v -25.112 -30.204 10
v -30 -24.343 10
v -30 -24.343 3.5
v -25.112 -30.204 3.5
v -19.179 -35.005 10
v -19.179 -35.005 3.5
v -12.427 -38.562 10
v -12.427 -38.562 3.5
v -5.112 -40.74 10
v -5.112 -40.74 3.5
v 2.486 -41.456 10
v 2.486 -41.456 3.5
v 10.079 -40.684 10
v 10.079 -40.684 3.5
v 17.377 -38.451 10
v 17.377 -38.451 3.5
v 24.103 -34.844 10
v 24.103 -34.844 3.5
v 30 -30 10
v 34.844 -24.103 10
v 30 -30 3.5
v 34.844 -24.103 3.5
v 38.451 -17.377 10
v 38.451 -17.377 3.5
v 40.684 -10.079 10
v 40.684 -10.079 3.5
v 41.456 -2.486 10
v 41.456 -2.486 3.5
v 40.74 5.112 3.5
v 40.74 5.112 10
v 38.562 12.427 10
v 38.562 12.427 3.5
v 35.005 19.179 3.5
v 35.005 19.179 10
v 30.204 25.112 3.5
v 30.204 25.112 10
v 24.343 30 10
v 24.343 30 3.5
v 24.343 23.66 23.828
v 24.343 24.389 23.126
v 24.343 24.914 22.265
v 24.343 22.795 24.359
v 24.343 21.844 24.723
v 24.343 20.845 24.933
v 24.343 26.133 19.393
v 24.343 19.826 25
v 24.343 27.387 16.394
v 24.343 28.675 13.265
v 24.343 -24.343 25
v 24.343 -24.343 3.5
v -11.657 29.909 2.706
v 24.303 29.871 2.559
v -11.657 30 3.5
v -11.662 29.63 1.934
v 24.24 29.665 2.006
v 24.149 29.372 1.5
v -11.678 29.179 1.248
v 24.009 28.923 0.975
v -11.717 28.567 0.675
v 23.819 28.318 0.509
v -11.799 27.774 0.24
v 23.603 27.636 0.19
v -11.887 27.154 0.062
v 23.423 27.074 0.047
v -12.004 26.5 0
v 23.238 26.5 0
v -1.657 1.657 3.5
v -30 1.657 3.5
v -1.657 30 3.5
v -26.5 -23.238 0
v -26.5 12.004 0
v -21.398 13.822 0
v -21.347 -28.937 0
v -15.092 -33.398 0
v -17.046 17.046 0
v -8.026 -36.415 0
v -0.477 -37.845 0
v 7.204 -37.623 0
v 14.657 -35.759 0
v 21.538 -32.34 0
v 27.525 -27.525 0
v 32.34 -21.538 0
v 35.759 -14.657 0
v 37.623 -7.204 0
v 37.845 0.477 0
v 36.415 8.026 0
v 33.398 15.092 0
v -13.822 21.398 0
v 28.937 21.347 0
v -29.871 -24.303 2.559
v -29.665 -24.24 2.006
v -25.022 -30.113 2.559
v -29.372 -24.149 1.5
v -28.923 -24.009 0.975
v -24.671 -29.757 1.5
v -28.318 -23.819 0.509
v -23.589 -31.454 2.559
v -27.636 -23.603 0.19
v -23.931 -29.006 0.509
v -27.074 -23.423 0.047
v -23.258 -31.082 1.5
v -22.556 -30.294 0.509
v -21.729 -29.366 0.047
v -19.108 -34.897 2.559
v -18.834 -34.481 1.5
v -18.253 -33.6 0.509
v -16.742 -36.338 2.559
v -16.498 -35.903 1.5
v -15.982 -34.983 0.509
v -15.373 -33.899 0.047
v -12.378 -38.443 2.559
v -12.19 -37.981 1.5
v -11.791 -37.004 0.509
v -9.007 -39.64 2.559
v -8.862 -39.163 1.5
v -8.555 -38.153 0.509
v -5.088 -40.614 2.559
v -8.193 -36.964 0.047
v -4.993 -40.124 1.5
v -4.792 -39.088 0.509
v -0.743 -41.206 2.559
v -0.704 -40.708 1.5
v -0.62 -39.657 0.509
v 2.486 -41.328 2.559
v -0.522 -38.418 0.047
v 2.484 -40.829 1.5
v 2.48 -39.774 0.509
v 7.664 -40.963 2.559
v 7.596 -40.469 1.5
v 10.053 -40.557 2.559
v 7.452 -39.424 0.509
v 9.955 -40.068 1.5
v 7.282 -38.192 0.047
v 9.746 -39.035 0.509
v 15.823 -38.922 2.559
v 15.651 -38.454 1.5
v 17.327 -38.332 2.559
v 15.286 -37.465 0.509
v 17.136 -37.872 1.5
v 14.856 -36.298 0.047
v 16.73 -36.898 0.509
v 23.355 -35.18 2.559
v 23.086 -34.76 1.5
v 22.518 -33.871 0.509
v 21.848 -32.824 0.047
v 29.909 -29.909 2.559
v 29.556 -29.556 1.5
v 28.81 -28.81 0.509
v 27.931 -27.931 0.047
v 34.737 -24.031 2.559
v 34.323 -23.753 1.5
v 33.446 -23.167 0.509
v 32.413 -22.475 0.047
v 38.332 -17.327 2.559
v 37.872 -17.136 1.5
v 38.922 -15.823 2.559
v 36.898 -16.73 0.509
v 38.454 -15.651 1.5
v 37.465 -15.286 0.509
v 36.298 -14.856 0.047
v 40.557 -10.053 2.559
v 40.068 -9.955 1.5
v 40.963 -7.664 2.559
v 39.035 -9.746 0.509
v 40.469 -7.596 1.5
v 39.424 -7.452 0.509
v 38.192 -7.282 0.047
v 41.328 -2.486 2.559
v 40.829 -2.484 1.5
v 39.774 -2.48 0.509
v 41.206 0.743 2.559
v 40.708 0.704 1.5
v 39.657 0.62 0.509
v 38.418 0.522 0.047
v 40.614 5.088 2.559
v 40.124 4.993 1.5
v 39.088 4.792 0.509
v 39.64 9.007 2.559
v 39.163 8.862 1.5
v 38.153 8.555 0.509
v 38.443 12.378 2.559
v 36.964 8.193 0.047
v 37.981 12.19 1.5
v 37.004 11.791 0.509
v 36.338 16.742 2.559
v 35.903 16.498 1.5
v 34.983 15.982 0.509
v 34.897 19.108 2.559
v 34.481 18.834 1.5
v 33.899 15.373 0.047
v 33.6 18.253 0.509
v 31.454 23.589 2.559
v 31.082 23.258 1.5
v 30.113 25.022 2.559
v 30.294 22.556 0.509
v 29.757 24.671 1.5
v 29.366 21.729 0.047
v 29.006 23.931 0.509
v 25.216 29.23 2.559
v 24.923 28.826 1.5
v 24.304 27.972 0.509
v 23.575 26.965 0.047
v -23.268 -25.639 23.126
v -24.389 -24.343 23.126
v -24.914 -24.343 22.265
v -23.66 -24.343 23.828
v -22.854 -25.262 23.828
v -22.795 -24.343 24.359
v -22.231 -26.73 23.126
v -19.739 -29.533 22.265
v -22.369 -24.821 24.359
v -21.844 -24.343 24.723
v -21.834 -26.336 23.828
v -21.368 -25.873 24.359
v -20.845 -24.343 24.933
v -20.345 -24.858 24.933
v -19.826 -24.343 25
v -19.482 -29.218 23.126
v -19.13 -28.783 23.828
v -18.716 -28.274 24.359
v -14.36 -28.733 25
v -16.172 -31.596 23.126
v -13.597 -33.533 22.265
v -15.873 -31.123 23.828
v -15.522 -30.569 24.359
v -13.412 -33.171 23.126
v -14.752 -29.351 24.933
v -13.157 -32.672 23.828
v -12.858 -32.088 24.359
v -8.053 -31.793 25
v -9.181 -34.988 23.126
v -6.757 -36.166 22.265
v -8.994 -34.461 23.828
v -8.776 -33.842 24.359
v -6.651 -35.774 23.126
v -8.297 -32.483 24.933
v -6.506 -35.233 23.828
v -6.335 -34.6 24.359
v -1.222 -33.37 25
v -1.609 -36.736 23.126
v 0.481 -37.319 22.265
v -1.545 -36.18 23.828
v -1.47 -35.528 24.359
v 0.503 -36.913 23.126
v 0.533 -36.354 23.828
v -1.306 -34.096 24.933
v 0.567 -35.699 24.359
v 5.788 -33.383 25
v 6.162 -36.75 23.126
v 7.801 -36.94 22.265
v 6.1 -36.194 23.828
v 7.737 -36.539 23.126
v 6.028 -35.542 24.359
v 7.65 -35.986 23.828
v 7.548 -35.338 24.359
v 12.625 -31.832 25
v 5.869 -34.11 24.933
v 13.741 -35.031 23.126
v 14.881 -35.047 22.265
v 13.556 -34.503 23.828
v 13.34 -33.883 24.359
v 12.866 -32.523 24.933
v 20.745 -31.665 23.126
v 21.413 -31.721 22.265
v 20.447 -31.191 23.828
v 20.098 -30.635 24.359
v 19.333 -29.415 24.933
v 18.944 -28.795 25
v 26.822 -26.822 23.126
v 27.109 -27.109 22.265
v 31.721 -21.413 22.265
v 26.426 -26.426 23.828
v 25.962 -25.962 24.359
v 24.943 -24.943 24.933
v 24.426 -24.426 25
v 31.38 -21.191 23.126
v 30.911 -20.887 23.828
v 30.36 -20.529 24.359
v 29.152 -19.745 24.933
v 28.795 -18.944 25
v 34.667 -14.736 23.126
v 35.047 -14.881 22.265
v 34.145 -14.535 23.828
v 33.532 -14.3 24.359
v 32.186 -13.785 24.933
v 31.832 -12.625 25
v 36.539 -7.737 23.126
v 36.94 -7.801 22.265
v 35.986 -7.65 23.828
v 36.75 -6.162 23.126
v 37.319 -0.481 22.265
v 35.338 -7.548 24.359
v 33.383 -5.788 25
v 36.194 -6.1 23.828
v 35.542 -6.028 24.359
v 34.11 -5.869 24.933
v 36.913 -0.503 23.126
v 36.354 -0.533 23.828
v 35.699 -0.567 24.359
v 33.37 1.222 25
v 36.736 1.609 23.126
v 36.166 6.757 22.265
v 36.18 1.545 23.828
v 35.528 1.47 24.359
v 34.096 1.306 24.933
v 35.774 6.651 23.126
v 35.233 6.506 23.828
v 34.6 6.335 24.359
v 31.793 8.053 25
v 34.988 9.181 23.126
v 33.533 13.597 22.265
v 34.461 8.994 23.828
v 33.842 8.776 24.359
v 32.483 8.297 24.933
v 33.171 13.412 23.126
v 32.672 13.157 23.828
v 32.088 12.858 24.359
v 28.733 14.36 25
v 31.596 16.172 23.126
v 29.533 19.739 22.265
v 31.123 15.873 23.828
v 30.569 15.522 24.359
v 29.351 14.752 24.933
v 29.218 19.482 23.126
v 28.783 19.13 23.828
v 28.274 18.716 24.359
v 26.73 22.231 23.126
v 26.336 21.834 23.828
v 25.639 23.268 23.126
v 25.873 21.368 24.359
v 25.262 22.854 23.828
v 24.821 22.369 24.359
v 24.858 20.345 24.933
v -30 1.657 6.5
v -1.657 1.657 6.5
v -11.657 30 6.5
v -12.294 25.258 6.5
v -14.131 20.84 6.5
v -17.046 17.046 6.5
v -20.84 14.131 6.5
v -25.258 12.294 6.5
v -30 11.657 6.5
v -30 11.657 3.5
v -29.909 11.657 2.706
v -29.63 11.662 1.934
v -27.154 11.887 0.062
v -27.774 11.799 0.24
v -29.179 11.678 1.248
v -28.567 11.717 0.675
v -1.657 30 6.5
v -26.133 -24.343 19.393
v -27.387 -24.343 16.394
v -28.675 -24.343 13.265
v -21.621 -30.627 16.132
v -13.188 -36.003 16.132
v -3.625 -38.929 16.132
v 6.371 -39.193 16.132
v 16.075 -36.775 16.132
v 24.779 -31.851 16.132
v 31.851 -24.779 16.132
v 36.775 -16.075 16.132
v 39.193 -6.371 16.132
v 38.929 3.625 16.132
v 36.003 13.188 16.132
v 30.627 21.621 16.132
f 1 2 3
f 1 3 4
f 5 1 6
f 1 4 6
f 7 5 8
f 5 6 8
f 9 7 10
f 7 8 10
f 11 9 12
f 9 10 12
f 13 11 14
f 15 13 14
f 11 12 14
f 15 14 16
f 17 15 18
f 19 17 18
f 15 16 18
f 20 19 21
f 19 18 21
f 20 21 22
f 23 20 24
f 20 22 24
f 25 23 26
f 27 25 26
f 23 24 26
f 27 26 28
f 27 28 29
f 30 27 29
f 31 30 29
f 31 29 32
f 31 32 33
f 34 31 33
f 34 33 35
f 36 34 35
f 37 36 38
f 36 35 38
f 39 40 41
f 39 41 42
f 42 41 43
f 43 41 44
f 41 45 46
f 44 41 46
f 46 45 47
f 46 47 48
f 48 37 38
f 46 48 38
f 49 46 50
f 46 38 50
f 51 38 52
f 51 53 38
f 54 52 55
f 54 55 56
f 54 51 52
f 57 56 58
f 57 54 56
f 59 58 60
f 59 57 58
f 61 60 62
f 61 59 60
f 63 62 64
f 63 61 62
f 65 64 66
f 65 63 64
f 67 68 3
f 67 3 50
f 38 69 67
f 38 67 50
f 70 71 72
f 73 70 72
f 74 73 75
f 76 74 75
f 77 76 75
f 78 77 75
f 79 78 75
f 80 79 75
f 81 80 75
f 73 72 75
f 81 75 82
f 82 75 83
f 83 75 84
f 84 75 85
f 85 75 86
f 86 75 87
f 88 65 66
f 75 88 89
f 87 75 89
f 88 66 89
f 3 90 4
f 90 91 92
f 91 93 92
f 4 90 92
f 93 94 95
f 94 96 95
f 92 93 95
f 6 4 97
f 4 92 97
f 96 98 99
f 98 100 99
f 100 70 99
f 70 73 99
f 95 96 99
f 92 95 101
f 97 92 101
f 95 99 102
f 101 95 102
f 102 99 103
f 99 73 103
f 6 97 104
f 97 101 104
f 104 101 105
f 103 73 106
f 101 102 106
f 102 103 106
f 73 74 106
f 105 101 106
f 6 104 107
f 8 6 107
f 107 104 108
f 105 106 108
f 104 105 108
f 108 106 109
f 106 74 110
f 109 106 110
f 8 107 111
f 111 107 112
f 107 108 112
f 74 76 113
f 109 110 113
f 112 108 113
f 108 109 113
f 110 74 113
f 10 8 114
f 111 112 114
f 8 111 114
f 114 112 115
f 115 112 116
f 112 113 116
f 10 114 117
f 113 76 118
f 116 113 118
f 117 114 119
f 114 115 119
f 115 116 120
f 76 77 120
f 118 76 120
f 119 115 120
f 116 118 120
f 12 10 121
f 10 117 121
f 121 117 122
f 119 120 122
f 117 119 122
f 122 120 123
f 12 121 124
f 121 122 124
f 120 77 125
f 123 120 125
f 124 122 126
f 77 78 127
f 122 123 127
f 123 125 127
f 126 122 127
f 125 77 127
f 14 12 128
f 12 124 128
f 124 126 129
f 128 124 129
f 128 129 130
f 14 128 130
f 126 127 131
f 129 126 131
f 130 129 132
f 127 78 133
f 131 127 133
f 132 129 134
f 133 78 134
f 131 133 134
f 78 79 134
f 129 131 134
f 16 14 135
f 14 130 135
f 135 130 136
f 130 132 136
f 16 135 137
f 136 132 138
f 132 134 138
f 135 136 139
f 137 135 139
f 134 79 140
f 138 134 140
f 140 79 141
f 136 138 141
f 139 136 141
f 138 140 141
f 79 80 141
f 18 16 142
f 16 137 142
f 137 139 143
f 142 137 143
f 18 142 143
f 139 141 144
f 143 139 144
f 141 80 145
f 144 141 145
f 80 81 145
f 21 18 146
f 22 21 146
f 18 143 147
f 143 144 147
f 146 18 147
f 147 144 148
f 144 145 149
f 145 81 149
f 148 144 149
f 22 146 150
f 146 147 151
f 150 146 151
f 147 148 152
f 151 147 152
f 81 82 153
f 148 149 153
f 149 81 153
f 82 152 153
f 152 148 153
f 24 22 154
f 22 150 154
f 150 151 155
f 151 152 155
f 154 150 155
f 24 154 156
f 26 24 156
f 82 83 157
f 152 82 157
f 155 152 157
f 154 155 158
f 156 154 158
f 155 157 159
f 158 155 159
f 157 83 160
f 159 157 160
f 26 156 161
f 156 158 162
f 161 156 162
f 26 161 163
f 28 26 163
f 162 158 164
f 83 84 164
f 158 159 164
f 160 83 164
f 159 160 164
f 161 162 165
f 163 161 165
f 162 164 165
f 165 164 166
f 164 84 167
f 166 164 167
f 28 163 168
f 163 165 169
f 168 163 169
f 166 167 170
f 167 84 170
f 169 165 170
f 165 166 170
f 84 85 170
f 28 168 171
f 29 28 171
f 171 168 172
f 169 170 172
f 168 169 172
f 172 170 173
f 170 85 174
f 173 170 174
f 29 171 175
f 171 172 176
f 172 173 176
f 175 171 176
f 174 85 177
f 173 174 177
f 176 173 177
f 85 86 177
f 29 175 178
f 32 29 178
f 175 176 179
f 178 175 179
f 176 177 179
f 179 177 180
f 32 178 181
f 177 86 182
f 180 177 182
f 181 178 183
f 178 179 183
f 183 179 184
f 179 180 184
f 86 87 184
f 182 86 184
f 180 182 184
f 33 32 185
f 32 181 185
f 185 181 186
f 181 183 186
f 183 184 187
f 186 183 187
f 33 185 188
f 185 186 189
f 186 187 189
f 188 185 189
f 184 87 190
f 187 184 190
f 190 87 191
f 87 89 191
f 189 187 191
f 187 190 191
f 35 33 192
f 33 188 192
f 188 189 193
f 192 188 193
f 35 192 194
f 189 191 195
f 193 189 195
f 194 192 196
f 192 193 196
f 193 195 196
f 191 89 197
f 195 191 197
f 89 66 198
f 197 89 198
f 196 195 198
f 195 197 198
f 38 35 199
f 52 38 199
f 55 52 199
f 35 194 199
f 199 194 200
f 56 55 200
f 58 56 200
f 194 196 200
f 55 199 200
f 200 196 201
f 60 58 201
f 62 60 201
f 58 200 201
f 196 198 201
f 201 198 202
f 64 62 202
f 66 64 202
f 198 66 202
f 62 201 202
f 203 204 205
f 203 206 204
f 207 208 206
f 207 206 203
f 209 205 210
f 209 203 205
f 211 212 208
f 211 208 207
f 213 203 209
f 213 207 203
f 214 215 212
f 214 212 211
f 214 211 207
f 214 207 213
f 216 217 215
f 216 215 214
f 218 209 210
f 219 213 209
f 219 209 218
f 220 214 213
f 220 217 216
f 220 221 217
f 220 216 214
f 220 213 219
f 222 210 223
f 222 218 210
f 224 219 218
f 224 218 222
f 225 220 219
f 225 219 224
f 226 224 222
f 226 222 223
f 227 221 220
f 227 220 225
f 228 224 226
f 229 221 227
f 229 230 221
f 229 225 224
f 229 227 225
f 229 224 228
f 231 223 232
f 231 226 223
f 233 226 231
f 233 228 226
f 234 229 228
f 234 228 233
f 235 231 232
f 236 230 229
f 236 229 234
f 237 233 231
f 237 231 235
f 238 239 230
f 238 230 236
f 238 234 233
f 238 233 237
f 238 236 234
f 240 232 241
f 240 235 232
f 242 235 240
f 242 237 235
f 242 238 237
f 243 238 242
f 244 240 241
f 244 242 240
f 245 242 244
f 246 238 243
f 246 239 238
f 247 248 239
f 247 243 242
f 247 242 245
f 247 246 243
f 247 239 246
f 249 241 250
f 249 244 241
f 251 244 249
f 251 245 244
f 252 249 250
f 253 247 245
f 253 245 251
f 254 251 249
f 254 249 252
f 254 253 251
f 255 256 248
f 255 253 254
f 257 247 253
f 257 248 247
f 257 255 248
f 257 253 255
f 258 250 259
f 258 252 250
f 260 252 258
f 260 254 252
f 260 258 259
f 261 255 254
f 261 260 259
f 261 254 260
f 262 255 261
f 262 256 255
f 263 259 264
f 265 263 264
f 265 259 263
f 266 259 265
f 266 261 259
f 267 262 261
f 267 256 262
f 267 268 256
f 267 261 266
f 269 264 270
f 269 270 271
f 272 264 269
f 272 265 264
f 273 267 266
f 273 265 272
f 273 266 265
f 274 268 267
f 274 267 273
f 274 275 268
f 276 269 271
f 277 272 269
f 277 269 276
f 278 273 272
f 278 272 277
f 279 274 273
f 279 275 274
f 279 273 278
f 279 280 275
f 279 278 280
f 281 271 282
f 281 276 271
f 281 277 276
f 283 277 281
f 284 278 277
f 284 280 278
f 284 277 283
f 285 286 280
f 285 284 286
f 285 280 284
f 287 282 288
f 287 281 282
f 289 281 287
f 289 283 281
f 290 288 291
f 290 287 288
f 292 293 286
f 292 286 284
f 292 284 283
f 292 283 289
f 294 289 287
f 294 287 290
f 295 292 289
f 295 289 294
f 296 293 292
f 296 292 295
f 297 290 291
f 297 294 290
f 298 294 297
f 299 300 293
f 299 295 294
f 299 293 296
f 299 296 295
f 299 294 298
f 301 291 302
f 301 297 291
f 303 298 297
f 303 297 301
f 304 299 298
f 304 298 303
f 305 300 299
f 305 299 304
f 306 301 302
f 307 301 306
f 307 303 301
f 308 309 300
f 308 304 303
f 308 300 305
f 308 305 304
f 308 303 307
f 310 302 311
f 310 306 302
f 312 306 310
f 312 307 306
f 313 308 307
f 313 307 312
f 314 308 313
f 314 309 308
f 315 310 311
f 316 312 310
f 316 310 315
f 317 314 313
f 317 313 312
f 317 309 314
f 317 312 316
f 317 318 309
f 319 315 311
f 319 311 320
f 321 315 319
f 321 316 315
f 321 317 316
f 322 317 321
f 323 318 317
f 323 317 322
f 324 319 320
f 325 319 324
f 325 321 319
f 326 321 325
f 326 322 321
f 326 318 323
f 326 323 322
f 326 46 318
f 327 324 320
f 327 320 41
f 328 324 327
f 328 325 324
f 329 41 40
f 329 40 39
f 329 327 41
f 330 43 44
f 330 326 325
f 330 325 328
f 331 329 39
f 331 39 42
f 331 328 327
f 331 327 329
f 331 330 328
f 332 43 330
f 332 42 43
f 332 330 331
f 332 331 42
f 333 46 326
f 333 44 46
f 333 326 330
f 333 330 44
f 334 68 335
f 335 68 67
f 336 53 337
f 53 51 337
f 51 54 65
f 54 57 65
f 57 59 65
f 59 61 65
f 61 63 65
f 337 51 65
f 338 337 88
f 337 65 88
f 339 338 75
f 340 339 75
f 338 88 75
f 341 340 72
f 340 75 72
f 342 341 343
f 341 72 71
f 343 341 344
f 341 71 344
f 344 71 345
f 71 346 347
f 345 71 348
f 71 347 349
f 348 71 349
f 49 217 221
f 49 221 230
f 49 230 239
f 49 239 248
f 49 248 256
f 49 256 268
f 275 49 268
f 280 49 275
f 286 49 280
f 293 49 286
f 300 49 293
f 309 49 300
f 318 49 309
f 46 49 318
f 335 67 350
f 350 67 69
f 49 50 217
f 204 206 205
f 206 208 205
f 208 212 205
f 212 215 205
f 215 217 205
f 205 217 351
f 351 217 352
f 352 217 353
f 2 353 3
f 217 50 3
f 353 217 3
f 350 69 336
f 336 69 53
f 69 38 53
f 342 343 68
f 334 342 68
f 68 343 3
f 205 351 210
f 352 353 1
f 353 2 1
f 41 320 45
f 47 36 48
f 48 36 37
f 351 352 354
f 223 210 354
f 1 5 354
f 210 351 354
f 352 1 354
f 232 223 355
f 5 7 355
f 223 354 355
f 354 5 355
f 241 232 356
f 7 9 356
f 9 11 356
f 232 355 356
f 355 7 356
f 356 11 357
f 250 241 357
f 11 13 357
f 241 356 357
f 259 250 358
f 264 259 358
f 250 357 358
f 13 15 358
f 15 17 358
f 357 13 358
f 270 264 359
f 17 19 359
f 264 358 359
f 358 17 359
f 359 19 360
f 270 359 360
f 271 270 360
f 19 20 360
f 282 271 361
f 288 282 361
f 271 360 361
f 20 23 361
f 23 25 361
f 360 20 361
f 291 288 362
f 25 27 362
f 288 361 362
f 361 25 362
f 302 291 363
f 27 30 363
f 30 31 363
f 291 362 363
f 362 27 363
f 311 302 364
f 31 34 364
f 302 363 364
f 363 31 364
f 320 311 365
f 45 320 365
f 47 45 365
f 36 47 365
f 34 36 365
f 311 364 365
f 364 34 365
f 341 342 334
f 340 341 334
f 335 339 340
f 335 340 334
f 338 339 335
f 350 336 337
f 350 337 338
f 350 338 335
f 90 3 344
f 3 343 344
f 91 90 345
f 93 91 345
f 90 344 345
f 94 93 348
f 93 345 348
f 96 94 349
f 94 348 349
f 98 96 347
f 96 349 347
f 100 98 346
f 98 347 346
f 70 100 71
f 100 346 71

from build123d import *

# Parameters (mm, degrees)
F1_DEPTH = 6.5
F2_DEPTH = 3.5
F3_DEPTH = 25
F4_R     = 3.49999
F5_SIZE2 = 15
F5_SIZE  = 5
F6_R     = 4


# Not quite as in the source:
# - a fillet or chamfer is up to 0.001 mm smaller than in the source, because OpenCascade refuses the exact size


with BuildPart() as f1:
    # F0 (on Top) → F1 (new body)
    with BuildSketch(Plane.XY):
        with BuildLine():
            Line((-1.6568542495, 1.6568542495), (-1.6568542495, 30))
            Line((-1.6568542495, 30), (-11.6568542495, 30))
            ThreePointArc((-11.6568542495, 30), (-17.0460019087, 17.0460019087), (-30, 11.6568542495))
            Line((-30, 11.6568542495), (-30, 1.6568542495))
            Line((-30, 1.6568542495), (-1.6568542495, 1.6568542495))
        make_face()
    extrude(amount=F1_DEPTH)

    # F0 (on Top) → F2 (join)
    with BuildSketch(Plane.XY):
        Polygon((24.3431457505, -24.3431457505), (24.3431457505, 30), (-1.6568542495, 30), (-1.6568542495, 1.6568542495), (-30, 1.6568542495), (-30, -24.3431457505), align=None)
    extrude(amount=F2_DEPTH)

    # F0 (on Top) → F3 (join)
    with BuildSketch(Plane.XY):
        with BuildLine():
            ThreePointArc((-30, -24.3431457505), (30, -30), (24.3431457505, 30))
            Line((24.3431457505, 30), (24.3431457505, -24.3431457505))
            Line((24.3431457505, -24.3431457505), (-30, -24.3431457505))
        make_face()
    extrude(amount=F3_DEPTH)

    # F4 (radius 3.5 in the source; OpenCascade refuses exactly that, so slightly less here)
    f4_edges = [f1.edges().sort_by_distance(p)[0] for p in [
        (30, -30, 0),
        (-30, -6.343146, 0),
        (6.343146, 30, 0),
    ]]
    fillet(f4_edges, radius=F4_R)

    # F5
    f5_edges = [f1.edges().sort_by_distance(p)[0] for p in [
        (30, -30, 25),
    ]]
    f5_side = f1.faces().sort_by_distance((29.285433, -29.285433, 25))[0]
    chamfer(f5_edges, length=F5_SIZE, length2=F5_SIZE2, reference=f5_side)

    # F6
    f6_edges = [f1.edges().sort_by_distance(p)[0] for p in [
        (26.464466, -26.464466, 25),
    ]]
    fillet(f6_edges, radius=F6_R)


solid = f1.part
